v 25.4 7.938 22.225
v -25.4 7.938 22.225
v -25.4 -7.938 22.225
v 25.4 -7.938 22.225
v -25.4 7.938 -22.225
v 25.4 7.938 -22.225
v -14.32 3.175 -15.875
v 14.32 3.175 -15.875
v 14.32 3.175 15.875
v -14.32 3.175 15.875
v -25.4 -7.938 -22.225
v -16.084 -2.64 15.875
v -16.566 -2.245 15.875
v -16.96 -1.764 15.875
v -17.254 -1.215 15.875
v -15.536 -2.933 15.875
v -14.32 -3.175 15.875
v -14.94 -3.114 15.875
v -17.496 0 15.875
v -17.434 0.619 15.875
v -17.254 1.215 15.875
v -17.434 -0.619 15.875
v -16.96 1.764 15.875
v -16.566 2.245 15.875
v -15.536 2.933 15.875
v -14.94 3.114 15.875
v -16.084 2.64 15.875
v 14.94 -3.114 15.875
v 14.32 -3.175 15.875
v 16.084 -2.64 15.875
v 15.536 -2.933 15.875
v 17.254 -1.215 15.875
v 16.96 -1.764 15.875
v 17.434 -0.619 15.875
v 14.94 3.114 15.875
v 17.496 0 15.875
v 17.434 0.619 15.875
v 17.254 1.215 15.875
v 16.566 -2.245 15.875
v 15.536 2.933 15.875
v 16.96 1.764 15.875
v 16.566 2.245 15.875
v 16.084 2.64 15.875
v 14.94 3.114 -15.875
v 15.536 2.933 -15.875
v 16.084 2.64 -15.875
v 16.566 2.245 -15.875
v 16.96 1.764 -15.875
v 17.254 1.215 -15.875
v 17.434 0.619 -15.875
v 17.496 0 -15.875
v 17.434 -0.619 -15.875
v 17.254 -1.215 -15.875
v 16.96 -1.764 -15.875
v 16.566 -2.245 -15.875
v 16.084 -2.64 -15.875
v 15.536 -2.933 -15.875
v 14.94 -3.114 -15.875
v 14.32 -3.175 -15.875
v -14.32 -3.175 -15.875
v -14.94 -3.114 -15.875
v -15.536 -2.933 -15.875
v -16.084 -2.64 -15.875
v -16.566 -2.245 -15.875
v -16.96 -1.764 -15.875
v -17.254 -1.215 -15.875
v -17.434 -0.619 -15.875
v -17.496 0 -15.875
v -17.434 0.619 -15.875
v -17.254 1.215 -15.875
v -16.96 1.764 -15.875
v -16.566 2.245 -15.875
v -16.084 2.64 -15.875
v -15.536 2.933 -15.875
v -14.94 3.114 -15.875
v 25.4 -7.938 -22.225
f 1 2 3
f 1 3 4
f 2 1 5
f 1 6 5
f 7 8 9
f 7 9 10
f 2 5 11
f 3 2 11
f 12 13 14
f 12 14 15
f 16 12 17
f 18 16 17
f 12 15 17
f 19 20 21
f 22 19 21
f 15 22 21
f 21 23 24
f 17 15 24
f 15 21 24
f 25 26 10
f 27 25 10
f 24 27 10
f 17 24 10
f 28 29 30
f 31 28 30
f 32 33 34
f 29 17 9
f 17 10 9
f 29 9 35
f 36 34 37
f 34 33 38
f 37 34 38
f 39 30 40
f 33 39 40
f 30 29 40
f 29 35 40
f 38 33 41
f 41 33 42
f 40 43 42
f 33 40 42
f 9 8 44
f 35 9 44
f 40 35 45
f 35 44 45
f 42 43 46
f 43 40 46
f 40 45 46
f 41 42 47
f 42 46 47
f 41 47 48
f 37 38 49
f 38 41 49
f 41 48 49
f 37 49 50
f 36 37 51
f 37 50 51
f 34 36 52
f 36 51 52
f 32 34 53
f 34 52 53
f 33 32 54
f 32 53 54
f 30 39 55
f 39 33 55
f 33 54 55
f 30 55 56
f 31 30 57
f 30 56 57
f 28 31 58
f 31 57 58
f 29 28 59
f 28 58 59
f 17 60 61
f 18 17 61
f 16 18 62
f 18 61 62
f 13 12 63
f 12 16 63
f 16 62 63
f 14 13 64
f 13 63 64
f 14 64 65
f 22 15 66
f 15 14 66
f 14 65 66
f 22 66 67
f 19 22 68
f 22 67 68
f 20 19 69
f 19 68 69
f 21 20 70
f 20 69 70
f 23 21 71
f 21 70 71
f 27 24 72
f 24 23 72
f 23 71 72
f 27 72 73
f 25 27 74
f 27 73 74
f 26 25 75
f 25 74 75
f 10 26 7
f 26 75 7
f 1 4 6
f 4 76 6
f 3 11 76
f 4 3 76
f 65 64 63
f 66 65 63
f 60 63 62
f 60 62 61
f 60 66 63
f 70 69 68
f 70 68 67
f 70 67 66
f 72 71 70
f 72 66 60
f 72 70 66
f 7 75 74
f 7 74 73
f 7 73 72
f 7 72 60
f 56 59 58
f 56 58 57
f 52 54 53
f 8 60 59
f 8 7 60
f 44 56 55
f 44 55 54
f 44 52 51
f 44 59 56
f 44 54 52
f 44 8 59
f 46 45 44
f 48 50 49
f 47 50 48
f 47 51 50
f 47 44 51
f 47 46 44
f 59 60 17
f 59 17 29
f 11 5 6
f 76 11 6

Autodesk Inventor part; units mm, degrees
ref_plane "YZ Plane" through (0, 0, 0) normal (1, 0, 0) x (0, 1, 0)
ref_plane "XZ Plane" through (0, 0, 0) normal (0, 1, 0) x (-1, 0, 0)
ref_plane "XY Plane" through (0, 0, 0) normal (0, 0, 1) x (1, 0, 0)
sketch "Sketch1" plane through (0, 0, -15.875) normal (0, 0, 1) x (1, 0, 0)
  line L0 (-14.3205, -3.175) -> (14.3205, -3.175)
  arc A0 (14.3205, -3.175) -> (14.3205, 3.175) centre (14.3205, 0) ccw
  line L1 (14.3205, 3.175) -> (-14.3205, 3.175)
  arc A1 (-14.3205, 3.175) -> (-14.3205, -3.175) centre (-14.3205, 0) ccw
  line L2 (-14.3205, -3.175) -> (-14.3205, -3.175)
sketch "Sketch2" plane through (0, 0, -22.225) normal (0, 0, 1) x (1, 0, 0)
  line L0 (-25.4, -7.9375) -> (25.4, -7.9375)
  line L1 (25.4, -7.9375) -> (25.4, 7.9375)
  line L2 (25.4, 7.9375) -> (-25.4, 7.9375)
  line L3 (-25.4, 7.9375) -> (-25.4, -7.9375)
  line L4 (-25.4, -7.9375) -> (25.4, 7.9375) construction
  line L5 (25.4, -7.9375) -> (-25.4, 7.9375) construction
  point P0 (0, 0)
extrude "Extrusion1" add sketch "Sketch2" along normal blind 44.45
extrude "Extrusion2" cut sketch "Sketch1" along normal blind 31.75
properties part number "00000_Single_Mode_Rect"
